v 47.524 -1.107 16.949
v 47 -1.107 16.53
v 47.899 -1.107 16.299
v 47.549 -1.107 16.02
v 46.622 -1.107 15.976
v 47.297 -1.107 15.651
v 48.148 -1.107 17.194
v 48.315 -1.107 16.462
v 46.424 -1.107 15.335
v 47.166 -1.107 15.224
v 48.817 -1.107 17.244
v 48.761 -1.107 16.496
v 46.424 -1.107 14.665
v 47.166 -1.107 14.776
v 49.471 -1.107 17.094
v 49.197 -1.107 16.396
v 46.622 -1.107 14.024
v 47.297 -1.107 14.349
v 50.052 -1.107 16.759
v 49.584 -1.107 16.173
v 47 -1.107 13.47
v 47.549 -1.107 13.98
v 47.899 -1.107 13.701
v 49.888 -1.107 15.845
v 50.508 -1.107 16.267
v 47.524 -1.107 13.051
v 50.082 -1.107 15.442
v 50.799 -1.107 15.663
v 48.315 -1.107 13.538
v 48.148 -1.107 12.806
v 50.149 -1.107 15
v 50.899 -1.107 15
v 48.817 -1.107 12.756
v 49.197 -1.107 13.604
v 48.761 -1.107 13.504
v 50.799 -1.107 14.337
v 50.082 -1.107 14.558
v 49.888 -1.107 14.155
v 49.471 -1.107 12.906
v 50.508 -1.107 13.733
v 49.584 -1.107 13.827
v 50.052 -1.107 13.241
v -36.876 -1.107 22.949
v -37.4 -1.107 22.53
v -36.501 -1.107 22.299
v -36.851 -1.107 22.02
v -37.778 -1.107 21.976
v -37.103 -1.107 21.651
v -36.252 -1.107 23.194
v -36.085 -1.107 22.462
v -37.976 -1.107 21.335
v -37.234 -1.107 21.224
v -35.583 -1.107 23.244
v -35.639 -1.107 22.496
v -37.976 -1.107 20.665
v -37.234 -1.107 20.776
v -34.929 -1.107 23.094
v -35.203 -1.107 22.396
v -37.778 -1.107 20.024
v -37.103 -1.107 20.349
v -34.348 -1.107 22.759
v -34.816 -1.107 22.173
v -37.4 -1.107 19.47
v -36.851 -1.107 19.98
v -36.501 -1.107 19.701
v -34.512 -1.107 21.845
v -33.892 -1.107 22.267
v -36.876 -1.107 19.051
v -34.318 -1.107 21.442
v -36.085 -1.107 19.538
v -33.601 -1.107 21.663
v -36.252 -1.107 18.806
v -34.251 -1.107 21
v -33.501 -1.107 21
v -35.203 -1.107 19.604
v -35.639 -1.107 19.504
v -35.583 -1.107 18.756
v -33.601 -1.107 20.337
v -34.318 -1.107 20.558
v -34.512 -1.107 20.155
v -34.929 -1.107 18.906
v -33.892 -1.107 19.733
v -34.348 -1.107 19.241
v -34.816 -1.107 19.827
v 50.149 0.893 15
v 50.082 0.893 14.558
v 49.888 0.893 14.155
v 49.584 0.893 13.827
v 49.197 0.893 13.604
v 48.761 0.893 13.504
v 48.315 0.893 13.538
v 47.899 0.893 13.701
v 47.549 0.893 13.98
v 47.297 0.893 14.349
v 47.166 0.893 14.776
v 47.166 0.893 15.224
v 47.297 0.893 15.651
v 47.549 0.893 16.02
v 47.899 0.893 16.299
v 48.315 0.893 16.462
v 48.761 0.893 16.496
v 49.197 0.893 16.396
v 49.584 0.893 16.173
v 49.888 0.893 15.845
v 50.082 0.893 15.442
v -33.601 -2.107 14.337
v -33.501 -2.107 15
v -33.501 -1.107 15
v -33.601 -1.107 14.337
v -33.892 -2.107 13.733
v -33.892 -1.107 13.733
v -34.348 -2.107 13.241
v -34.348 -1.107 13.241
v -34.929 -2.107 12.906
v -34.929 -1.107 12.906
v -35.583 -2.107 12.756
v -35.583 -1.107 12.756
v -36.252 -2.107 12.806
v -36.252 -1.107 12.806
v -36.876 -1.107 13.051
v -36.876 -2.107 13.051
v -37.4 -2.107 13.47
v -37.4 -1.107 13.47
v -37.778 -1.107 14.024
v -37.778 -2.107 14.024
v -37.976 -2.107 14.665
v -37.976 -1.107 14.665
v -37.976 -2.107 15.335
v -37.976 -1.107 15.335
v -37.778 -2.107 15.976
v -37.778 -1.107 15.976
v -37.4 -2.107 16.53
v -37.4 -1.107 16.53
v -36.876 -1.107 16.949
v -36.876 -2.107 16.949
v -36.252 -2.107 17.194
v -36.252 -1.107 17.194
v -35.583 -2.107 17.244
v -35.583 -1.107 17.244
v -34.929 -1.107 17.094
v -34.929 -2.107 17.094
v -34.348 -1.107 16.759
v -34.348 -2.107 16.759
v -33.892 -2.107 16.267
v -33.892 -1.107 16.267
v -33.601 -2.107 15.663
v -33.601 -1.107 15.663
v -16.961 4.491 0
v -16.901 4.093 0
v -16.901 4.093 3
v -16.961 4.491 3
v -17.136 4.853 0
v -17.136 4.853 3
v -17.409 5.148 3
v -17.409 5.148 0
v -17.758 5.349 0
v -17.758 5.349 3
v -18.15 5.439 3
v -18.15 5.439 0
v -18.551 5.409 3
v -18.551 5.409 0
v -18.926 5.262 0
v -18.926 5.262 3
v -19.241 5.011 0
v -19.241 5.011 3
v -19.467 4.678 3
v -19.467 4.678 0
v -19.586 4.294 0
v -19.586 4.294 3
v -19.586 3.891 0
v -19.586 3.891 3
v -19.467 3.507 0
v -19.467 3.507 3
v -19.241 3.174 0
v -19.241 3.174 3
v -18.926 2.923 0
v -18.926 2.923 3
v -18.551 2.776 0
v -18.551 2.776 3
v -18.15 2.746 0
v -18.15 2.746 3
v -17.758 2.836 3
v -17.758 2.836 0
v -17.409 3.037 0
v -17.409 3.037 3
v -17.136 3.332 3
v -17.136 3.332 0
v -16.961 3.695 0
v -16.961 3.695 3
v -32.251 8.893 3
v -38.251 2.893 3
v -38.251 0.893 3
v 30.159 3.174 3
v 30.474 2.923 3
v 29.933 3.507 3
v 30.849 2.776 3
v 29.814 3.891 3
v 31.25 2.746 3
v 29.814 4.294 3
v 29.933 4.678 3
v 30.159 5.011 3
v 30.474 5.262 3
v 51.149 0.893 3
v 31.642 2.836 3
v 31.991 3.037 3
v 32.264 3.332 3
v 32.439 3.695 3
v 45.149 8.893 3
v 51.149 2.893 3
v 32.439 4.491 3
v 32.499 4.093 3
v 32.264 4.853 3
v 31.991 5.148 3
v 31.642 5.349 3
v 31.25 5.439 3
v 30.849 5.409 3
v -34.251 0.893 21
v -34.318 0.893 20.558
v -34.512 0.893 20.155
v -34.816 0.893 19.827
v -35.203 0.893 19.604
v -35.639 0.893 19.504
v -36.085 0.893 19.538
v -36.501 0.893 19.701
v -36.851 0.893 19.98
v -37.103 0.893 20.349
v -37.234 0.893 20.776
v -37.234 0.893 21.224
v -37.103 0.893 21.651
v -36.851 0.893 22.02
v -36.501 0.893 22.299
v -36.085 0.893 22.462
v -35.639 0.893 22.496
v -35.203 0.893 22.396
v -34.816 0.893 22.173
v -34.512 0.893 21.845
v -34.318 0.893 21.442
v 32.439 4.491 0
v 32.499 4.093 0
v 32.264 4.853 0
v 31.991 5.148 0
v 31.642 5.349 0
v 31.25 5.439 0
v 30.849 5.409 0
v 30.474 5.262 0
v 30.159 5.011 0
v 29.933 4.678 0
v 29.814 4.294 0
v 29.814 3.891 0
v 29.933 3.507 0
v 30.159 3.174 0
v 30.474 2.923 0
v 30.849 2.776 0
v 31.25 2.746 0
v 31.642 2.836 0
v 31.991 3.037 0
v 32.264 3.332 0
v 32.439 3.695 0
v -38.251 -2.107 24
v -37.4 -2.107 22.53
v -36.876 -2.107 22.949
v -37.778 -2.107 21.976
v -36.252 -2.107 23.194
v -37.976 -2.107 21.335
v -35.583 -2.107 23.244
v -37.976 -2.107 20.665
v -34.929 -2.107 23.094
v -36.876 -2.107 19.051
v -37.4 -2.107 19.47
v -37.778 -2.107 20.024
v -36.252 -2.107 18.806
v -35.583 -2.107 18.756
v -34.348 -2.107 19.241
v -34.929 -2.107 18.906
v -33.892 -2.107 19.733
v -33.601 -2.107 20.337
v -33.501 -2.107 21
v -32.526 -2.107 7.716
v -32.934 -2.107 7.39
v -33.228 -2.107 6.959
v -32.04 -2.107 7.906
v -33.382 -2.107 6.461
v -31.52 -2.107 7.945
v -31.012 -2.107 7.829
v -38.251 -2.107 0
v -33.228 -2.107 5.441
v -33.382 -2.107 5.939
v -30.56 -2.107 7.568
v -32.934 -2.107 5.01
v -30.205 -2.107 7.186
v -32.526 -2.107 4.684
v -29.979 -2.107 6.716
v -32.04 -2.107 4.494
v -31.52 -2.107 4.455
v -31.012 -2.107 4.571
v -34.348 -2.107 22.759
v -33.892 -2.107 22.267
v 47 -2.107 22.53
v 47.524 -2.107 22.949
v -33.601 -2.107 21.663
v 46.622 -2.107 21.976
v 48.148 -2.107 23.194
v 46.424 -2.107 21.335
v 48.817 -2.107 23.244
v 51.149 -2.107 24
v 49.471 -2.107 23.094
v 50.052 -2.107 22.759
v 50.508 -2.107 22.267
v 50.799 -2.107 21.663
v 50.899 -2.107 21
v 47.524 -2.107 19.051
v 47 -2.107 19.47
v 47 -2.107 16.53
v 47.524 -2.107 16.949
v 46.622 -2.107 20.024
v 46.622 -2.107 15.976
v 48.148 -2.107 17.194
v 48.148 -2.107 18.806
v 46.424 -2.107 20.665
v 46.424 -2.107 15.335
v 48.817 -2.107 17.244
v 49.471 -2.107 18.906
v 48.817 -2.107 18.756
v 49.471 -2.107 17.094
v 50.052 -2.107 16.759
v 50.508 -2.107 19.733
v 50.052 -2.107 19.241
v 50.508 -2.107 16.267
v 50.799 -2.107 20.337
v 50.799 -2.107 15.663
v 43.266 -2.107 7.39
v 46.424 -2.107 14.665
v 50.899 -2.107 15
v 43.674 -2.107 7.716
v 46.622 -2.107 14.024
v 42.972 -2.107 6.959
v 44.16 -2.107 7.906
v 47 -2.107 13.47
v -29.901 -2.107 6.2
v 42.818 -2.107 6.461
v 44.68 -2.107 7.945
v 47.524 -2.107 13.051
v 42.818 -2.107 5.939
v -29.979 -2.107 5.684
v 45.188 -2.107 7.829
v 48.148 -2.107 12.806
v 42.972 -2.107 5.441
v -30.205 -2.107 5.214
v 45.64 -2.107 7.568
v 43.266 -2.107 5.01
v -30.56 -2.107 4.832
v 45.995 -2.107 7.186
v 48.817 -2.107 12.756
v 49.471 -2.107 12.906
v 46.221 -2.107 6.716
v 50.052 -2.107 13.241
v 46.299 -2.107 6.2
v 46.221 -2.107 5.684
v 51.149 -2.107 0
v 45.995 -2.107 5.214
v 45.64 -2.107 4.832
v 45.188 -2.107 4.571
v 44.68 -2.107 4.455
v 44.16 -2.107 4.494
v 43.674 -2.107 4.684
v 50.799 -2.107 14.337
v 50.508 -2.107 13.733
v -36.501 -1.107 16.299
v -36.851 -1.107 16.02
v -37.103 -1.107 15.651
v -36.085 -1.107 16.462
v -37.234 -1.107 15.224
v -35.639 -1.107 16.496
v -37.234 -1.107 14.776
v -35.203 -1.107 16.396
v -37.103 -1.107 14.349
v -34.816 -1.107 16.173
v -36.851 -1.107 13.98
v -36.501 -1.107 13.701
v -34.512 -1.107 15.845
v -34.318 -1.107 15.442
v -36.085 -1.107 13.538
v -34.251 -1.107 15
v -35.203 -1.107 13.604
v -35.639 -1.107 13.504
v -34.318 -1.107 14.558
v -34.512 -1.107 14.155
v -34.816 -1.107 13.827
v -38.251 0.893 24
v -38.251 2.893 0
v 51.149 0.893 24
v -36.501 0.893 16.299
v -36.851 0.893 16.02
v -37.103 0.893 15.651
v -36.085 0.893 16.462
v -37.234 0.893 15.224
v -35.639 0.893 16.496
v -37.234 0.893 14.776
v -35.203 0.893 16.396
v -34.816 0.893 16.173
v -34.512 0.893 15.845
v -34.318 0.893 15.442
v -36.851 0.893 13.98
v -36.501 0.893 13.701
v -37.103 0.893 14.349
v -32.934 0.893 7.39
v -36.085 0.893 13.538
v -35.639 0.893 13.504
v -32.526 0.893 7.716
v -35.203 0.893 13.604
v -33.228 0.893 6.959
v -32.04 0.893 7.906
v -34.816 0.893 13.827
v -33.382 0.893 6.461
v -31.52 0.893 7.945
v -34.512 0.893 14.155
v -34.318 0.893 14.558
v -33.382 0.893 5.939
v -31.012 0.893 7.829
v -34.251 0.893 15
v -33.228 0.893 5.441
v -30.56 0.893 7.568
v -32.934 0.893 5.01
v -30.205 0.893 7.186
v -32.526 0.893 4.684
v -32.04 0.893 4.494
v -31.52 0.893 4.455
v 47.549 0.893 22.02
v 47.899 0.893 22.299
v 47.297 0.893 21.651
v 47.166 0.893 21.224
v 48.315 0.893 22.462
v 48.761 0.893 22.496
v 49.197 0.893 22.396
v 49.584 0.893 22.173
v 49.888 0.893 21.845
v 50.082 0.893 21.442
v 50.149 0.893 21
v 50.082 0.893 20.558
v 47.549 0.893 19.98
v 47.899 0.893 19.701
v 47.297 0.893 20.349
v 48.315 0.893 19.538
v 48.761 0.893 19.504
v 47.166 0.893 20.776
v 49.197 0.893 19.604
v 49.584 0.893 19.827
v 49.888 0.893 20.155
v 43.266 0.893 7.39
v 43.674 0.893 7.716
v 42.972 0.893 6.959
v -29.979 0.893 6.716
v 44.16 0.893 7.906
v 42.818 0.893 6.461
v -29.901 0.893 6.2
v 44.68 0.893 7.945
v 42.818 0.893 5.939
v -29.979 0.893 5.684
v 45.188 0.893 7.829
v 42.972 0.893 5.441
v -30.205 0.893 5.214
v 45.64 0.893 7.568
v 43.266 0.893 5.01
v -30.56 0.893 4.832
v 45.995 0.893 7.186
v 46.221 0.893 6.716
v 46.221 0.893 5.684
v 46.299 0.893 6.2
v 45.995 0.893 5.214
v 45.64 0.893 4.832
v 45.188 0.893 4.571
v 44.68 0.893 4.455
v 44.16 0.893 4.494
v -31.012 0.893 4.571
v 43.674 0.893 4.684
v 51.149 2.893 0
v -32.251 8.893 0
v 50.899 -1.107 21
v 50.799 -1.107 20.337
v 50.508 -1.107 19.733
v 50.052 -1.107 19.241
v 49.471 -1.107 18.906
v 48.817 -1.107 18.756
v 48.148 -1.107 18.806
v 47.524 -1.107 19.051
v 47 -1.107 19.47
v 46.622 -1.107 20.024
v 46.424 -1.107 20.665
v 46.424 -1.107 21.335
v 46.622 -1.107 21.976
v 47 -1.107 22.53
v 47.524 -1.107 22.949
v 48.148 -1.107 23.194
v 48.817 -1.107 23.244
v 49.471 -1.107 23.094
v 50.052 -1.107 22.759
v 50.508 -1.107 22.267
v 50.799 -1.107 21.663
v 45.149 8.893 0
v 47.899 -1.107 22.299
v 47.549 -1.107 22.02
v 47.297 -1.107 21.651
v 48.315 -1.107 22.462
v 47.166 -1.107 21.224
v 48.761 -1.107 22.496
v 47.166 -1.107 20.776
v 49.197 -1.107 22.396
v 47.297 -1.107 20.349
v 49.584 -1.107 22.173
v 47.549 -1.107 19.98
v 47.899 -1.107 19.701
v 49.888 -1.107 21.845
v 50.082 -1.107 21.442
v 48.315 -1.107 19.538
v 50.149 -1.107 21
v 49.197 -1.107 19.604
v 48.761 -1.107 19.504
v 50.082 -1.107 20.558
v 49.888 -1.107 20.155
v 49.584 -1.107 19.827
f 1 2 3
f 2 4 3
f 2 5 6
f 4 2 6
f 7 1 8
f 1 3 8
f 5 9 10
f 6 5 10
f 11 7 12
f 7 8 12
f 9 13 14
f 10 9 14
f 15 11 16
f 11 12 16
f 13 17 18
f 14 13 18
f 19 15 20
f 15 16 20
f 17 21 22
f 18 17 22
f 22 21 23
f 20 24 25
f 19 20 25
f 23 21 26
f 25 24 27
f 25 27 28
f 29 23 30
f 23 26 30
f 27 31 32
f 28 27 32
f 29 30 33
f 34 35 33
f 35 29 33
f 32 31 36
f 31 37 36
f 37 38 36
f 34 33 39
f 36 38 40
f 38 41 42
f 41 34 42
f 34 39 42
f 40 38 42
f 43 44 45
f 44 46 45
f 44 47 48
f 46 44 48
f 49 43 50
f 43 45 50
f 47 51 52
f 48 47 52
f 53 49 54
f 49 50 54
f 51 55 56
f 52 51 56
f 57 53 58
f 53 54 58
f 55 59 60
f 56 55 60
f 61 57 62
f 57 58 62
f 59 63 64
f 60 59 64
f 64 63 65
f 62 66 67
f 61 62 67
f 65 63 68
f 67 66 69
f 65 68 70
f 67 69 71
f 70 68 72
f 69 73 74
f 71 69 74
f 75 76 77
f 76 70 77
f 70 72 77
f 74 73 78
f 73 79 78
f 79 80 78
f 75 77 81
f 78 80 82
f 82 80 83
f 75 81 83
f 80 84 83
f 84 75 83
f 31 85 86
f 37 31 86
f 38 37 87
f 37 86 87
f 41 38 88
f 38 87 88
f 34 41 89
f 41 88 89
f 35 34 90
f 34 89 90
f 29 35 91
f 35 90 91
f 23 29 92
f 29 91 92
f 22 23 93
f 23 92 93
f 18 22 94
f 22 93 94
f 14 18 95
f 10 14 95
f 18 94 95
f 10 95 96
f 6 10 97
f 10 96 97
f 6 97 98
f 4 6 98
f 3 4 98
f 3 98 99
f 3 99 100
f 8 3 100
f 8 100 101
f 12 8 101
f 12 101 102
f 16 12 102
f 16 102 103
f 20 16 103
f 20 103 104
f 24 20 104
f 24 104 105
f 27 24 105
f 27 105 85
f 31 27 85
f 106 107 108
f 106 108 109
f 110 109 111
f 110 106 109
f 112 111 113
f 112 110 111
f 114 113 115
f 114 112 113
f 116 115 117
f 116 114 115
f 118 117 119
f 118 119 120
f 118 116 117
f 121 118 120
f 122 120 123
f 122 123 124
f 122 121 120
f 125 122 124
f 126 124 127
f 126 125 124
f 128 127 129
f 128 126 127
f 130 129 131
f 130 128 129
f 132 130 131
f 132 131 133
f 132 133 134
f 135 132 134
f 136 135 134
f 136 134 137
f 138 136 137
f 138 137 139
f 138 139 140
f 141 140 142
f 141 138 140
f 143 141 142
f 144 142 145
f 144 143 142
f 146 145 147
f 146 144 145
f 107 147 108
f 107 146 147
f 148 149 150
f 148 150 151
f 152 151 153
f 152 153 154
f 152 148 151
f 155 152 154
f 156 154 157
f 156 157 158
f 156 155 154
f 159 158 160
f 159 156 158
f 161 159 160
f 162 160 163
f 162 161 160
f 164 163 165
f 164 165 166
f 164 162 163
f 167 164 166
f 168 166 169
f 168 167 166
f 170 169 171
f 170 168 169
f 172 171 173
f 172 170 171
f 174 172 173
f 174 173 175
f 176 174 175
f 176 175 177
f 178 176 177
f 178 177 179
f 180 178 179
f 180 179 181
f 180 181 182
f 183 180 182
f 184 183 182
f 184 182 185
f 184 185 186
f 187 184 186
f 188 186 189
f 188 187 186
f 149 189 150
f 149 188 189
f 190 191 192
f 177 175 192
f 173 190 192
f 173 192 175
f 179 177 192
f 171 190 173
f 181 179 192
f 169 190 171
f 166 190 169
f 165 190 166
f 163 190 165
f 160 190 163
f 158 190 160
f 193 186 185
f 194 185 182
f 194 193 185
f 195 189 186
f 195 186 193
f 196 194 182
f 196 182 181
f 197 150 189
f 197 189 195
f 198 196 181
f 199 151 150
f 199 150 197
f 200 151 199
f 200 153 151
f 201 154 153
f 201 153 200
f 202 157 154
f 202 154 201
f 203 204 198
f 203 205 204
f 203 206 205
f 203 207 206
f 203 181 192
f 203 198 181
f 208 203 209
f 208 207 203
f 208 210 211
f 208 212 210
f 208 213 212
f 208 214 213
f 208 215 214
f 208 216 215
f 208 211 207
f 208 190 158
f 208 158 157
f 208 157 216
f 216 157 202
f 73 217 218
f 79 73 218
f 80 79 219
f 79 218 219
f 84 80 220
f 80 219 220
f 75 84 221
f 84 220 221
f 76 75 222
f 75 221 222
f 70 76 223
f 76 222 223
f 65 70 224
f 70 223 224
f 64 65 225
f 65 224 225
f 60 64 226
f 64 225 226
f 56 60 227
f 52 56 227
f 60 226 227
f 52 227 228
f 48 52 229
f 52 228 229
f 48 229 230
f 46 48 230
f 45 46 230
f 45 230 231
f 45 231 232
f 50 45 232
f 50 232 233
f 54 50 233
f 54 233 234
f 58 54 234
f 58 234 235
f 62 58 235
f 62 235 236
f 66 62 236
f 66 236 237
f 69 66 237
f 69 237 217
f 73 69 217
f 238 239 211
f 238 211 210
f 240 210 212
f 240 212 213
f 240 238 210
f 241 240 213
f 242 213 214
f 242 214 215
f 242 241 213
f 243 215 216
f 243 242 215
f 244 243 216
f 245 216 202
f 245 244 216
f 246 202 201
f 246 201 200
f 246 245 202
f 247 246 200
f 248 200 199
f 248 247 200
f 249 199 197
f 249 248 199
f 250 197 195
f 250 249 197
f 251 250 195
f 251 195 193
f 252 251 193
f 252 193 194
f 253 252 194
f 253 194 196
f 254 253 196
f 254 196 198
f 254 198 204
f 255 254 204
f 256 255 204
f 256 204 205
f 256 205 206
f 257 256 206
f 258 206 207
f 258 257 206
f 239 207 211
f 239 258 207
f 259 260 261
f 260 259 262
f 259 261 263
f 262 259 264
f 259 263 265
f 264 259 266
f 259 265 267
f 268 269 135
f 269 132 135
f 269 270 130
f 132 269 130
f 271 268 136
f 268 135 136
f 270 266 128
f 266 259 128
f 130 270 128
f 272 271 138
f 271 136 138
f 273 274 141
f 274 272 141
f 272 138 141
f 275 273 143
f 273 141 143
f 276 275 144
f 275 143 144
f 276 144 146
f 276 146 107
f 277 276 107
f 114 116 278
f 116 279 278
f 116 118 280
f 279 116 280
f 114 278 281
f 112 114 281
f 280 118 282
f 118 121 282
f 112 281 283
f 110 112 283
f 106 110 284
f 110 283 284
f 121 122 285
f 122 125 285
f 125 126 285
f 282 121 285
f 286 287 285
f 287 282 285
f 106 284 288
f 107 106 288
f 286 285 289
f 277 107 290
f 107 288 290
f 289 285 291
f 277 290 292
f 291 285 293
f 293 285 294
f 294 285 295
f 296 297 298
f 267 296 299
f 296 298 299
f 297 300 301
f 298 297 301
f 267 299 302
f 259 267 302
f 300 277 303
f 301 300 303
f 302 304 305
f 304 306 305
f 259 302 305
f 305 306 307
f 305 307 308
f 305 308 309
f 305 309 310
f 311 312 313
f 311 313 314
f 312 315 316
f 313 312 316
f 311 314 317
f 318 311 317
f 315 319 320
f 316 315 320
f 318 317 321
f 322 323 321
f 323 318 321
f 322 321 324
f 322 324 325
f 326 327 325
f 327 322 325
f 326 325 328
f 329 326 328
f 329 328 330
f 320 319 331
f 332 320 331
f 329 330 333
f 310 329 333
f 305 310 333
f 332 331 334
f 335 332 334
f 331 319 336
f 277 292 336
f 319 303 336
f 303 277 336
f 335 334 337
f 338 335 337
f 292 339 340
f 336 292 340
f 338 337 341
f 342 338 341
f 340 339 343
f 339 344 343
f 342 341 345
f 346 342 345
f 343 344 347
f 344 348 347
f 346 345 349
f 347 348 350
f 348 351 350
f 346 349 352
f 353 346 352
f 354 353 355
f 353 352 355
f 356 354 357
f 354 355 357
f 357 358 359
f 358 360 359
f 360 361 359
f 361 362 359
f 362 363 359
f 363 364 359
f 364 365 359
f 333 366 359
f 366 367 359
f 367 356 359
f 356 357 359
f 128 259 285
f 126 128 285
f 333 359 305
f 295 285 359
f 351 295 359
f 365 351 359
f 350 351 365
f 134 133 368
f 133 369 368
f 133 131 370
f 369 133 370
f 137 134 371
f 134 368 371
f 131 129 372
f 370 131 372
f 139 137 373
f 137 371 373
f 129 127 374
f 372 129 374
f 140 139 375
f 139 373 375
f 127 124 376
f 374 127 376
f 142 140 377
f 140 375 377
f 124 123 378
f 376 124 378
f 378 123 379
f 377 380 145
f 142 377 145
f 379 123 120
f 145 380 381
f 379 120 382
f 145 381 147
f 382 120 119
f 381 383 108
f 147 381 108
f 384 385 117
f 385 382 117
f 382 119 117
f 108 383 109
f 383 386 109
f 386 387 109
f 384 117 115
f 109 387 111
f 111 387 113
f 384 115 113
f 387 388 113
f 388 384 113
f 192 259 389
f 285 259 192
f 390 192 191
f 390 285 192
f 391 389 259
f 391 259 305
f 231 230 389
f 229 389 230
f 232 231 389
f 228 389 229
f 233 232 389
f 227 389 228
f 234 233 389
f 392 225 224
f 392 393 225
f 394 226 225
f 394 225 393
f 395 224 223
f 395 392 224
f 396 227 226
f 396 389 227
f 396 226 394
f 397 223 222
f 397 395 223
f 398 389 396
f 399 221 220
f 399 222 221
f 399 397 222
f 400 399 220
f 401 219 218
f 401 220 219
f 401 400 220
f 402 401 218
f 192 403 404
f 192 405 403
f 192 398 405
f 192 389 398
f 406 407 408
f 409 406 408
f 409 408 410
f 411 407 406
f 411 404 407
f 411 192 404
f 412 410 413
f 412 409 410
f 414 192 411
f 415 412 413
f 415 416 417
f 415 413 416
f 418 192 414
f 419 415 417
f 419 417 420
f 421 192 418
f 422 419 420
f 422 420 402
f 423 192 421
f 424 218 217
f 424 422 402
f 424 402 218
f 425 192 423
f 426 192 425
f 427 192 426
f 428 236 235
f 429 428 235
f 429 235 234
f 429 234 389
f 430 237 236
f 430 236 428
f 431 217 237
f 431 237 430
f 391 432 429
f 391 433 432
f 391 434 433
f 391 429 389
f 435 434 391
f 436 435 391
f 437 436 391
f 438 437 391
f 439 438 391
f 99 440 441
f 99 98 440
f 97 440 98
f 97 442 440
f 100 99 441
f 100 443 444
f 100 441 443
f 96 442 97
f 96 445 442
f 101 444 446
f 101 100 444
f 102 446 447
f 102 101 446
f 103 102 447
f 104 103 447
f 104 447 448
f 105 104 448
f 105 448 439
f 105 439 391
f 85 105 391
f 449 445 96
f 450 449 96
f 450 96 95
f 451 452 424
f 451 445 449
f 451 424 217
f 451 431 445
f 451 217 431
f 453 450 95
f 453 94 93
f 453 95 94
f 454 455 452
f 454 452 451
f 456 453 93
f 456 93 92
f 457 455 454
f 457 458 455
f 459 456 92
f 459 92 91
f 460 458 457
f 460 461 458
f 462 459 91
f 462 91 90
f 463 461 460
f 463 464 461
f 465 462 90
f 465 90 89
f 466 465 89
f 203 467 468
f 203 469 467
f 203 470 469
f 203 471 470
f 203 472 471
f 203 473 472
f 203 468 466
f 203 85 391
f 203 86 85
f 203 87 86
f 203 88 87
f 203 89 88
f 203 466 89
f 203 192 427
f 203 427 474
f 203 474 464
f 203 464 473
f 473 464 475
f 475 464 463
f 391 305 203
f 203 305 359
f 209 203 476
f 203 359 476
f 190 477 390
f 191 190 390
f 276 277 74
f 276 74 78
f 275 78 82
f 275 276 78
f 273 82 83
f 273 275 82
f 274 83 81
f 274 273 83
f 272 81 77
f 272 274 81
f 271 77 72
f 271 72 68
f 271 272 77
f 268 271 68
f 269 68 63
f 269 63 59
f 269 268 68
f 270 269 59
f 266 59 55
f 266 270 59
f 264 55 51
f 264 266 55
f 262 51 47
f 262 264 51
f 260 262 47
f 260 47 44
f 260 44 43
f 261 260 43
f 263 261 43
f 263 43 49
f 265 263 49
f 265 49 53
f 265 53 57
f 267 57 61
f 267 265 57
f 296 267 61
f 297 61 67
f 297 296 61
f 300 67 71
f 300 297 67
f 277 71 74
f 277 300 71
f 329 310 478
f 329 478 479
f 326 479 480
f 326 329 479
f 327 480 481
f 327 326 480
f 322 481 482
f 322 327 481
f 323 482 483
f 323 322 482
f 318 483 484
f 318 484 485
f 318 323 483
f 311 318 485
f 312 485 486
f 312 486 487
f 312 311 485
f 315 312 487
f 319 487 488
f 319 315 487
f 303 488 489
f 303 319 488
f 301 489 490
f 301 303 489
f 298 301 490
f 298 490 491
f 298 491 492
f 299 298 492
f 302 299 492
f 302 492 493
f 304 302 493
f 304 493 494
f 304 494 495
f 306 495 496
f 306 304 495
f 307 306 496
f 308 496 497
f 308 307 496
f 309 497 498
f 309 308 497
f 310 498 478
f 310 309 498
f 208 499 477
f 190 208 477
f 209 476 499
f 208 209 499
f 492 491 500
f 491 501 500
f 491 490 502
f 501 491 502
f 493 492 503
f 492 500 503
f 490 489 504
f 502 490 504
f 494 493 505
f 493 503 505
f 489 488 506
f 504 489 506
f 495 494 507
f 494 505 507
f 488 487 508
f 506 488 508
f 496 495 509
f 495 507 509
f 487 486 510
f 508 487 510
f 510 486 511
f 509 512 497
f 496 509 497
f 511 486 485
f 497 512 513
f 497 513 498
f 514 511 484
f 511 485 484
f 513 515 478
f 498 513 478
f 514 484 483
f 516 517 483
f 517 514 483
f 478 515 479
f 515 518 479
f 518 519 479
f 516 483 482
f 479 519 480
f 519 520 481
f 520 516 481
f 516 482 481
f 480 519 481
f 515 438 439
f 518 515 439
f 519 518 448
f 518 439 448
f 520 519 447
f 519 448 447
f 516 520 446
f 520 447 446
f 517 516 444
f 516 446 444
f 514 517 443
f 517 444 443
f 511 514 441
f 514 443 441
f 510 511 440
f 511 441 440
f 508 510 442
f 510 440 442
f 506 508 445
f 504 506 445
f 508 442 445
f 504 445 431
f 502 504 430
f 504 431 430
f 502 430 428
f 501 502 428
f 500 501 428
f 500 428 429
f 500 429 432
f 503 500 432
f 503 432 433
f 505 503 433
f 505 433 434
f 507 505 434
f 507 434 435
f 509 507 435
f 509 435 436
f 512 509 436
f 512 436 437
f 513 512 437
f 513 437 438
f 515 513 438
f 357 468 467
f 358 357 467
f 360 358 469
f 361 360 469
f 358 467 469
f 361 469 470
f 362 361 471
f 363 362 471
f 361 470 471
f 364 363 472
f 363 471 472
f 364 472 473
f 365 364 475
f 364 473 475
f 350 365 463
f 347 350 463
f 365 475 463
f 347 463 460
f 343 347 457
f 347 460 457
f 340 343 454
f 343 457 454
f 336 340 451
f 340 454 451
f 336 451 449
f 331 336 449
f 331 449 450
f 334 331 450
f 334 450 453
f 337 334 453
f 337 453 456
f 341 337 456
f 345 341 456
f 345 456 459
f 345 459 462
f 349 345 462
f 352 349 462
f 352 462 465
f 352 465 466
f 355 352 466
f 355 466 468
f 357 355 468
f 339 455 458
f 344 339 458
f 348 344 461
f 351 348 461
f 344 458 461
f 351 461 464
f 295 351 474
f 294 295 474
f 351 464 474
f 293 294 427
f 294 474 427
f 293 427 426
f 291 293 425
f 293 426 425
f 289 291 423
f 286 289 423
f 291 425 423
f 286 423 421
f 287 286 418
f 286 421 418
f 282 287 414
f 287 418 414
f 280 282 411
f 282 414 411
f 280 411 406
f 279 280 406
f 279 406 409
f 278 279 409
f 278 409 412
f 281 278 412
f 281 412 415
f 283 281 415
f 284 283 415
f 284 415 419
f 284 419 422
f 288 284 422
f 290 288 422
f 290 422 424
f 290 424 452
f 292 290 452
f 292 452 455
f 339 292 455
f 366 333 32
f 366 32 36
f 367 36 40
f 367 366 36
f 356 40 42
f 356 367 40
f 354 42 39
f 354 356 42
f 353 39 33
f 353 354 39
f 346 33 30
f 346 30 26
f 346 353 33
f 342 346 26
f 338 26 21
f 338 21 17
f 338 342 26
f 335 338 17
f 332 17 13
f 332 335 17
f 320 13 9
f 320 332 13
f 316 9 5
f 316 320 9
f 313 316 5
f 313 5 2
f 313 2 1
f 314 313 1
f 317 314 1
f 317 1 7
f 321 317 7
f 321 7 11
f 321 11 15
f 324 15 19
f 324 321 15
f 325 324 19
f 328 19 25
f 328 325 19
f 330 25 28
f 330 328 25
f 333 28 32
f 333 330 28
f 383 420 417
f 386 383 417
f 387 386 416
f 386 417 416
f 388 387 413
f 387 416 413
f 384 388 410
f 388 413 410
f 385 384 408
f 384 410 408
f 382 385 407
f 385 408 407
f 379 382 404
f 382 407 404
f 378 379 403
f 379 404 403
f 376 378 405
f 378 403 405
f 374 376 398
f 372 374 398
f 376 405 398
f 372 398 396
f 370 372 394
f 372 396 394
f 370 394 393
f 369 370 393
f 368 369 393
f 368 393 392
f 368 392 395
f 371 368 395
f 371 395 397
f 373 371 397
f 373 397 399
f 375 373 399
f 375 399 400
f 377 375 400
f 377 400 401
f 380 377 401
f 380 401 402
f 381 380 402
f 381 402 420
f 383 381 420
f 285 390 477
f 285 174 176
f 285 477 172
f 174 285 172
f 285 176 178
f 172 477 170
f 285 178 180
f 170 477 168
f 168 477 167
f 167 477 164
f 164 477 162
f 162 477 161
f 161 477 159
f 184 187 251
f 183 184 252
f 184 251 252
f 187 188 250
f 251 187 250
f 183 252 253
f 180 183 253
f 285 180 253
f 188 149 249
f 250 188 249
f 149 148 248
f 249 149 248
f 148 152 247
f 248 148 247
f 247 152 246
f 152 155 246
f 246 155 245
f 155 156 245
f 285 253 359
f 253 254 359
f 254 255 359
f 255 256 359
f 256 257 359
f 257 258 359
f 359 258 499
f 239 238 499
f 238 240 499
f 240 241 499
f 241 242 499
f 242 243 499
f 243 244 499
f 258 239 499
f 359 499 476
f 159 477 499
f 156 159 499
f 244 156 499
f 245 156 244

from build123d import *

# Parameters (mm, degrees)
SKETCH1_R           = 1.35
BOSS_EXTRUDE1_DEPTH = 3
SKETCH1_3_W         = 89.4
SKETCH1_3_H         = 3
BOSS_EXTRUDE2_DEPTH = 24
CUT_EXTRUDE1_REACH  = 5
SKETCH3_R           = 1.5
SKETCH3_R_2         = 1.75
CUT_EXTRUDE2_START  = -3
SKETCH3_5_R         = 2.25
SKETCH3_5_R_2       = 1.5
CUT_EXTRUDE2_DEPTH  = 1


with BuildPart() as part:
    # Sketch1 → Boss-Extrude1 (new body)
    with BuildSketch(Plane.XY):
        Polygon((-32.2510699, 8.892599614), (-38.2510699, 2.892599614), (-38.2510699, 0.892599614), (51.1489301, 0.892599614), (51.1489301, 2.892599614), (45.1489301, 8.892599614), align=None)
        with Locations((-18.2510699, 4.092599614)):
            Circle(SKETCH1_R, mode=Mode.SUBTRACT)
        with Locations((31.1489301, 4.092599614)):
            Circle(SKETCH1_R, mode=Mode.SUBTRACT)
    extrude(amount=BOSS_EXTRUDE1_DEPTH)

    # Sketch1<3> → Boss-Extrude2 (add)
    with BuildSketch(Plane.XY):
        with Locations((6.4489301, -0.607400386)):
            Rectangle(SKETCH1_3_W, SKETCH1_3_H)
    extrude(amount=BOSS_EXTRUDE2_DEPTH)

    # Sketch3 → Cut-Extrude1 (cut, up to next)
    with BuildSketch(Plane(origin=(0, 0.892599614, 0), x_dir=(1, 0, 0), z_dir=(0, 1, 0)), mode=Mode.PRIVATE) as cut_extrude1_sk1:
        with Locations((48.6489301, -15)):
            Circle(SKETCH3_R)
    cut_extrude1_tool1 = extrude(cut_extrude1_sk1.sketch, amount=-CUT_EXTRUDE1_REACH, mode=Mode.PRIVATE) & part.part
    add(cut_extrude1_tool1.solids().sort_by_distance((48.64893, 0.8926, 15))[0], mode=Mode.SUBTRACT)
    # Sketch3 → Cut-Extrude1 (cut, up to next)
    with BuildSketch(Plane(origin=(0, 0.892599614, 0), x_dir=(1, 0, 0), z_dir=(0, 1, 0)), mode=Mode.PRIVATE) as cut_extrude1_sk2:
        with Locations((48.6489301, -21)):
            Circle(SKETCH3_R)
    cut_extrude1_tool2 = extrude(cut_extrude1_sk2.sketch, amount=-CUT_EXTRUDE1_REACH, mode=Mode.PRIVATE) & part.part
    add(cut_extrude1_tool2.solids().sort_by_distance((48.64893, 0.8926, 21))[0], mode=Mode.SUBTRACT)
    # Sketch3 → Cut-Extrude1 (cut, up to next)
    with BuildSketch(Plane(origin=(0, 0.892599614, 0), x_dir=(1, 0, 0), z_dir=(0, 1, 0)), mode=Mode.PRIVATE) as cut_extrude1_sk3:
        with Locations((-35.7510699, -15)):
            Circle(SKETCH3_R)
    cut_extrude1_tool3 = extrude(cut_extrude1_sk3.sketch, amount=-CUT_EXTRUDE1_REACH, mode=Mode.PRIVATE) & part.part
    add(cut_extrude1_tool3.solids().sort_by_distance((-35.75107, 0.8926, 15))[0], mode=Mode.SUBTRACT)
    # Sketch3 → Cut-Extrude1 (cut, up to next)
    with BuildSketch(Plane(origin=(0, 0.892599614, 0), x_dir=(1, 0, 0), z_dir=(0, 1, 0)), mode=Mode.PRIVATE) as cut_extrude1_sk4:
        with Locations((-35.7510699, -21)):
            Circle(SKETCH3_R)
    cut_extrude1_tool4 = extrude(cut_extrude1_sk4.sketch, amount=-CUT_EXTRUDE1_REACH, mode=Mode.PRIVATE) & part.part
    add(cut_extrude1_tool4.solids().sort_by_distance((-35.75107, 0.8926, 21))[0], mode=Mode.SUBTRACT)
    # Sketch3 → Cut-Extrude1 (cut, up to next)
    with BuildSketch(Plane(origin=(0, 0.892599614, 0), x_dir=(1, 0, 0), z_dir=(0, 1, 0)), mode=Mode.PRIVATE) as cut_extrude1_sk5:
        with Locations((44.5489301, -6.2)):
            Circle(SKETCH3_R_2)
    cut_extrude1_tool5 = extrude(cut_extrude1_sk5.sketch, amount=-CUT_EXTRUDE1_REACH, mode=Mode.PRIVATE) & part.part
    add(cut_extrude1_tool5.solids().sort_by_distance((44.54893, 0.8926, 6.2))[0], mode=Mode.SUBTRACT)
    # Sketch3 → Cut-Extrude1 (cut, up to next)
    with BuildSketch(Plane(origin=(0, 0.892599614, 0), x_dir=(1, 0, 0), z_dir=(0, 1, 0)), mode=Mode.PRIVATE) as cut_extrude1_sk6:
        with Locations((-31.6510699, -6.2)):
            Circle(SKETCH3_R_2)
    cut_extrude1_tool6 = extrude(cut_extrude1_sk6.sketch, amount=-CUT_EXTRUDE1_REACH, mode=Mode.PRIVATE) & part.part
    add(cut_extrude1_tool6.solids().sort_by_distance((-31.65107, 0.8926, 6.2))[0], mode=Mode.SUBTRACT)

    # Sketch3<5> → Cut-Extrude2 (cut)
    with BuildSketch(Plane(origin=(0, 0.892599614, 0), x_dir=(1, 0, 0), z_dir=(0, 1, 0)).offset(CUT_EXTRUDE2_START)):
        with Locations((-35.7510699, -15)):
            Circle(SKETCH3_5_R)
        with Locations((-35.7510699, -15)):
            Circle(SKETCH3_5_R_2, mode=Mode.SUBTRACT)
        with Locations((-35.7510699, -21)):
            Circle(SKETCH3_5_R)
        with Locations((-35.7510699, -21)):
            Circle(SKETCH3_5_R_2, mode=Mode.SUBTRACT)
        with Locations((48.6489301, -15)):
            Circle(SKETCH3_5_R)
        with Locations((48.6489301, -21)):
            Circle(SKETCH3_5_R)
    extrude(amount=CUT_EXTRUDE2_DEPTH, mode=Mode.SUBTRACT)


solid = part.part
